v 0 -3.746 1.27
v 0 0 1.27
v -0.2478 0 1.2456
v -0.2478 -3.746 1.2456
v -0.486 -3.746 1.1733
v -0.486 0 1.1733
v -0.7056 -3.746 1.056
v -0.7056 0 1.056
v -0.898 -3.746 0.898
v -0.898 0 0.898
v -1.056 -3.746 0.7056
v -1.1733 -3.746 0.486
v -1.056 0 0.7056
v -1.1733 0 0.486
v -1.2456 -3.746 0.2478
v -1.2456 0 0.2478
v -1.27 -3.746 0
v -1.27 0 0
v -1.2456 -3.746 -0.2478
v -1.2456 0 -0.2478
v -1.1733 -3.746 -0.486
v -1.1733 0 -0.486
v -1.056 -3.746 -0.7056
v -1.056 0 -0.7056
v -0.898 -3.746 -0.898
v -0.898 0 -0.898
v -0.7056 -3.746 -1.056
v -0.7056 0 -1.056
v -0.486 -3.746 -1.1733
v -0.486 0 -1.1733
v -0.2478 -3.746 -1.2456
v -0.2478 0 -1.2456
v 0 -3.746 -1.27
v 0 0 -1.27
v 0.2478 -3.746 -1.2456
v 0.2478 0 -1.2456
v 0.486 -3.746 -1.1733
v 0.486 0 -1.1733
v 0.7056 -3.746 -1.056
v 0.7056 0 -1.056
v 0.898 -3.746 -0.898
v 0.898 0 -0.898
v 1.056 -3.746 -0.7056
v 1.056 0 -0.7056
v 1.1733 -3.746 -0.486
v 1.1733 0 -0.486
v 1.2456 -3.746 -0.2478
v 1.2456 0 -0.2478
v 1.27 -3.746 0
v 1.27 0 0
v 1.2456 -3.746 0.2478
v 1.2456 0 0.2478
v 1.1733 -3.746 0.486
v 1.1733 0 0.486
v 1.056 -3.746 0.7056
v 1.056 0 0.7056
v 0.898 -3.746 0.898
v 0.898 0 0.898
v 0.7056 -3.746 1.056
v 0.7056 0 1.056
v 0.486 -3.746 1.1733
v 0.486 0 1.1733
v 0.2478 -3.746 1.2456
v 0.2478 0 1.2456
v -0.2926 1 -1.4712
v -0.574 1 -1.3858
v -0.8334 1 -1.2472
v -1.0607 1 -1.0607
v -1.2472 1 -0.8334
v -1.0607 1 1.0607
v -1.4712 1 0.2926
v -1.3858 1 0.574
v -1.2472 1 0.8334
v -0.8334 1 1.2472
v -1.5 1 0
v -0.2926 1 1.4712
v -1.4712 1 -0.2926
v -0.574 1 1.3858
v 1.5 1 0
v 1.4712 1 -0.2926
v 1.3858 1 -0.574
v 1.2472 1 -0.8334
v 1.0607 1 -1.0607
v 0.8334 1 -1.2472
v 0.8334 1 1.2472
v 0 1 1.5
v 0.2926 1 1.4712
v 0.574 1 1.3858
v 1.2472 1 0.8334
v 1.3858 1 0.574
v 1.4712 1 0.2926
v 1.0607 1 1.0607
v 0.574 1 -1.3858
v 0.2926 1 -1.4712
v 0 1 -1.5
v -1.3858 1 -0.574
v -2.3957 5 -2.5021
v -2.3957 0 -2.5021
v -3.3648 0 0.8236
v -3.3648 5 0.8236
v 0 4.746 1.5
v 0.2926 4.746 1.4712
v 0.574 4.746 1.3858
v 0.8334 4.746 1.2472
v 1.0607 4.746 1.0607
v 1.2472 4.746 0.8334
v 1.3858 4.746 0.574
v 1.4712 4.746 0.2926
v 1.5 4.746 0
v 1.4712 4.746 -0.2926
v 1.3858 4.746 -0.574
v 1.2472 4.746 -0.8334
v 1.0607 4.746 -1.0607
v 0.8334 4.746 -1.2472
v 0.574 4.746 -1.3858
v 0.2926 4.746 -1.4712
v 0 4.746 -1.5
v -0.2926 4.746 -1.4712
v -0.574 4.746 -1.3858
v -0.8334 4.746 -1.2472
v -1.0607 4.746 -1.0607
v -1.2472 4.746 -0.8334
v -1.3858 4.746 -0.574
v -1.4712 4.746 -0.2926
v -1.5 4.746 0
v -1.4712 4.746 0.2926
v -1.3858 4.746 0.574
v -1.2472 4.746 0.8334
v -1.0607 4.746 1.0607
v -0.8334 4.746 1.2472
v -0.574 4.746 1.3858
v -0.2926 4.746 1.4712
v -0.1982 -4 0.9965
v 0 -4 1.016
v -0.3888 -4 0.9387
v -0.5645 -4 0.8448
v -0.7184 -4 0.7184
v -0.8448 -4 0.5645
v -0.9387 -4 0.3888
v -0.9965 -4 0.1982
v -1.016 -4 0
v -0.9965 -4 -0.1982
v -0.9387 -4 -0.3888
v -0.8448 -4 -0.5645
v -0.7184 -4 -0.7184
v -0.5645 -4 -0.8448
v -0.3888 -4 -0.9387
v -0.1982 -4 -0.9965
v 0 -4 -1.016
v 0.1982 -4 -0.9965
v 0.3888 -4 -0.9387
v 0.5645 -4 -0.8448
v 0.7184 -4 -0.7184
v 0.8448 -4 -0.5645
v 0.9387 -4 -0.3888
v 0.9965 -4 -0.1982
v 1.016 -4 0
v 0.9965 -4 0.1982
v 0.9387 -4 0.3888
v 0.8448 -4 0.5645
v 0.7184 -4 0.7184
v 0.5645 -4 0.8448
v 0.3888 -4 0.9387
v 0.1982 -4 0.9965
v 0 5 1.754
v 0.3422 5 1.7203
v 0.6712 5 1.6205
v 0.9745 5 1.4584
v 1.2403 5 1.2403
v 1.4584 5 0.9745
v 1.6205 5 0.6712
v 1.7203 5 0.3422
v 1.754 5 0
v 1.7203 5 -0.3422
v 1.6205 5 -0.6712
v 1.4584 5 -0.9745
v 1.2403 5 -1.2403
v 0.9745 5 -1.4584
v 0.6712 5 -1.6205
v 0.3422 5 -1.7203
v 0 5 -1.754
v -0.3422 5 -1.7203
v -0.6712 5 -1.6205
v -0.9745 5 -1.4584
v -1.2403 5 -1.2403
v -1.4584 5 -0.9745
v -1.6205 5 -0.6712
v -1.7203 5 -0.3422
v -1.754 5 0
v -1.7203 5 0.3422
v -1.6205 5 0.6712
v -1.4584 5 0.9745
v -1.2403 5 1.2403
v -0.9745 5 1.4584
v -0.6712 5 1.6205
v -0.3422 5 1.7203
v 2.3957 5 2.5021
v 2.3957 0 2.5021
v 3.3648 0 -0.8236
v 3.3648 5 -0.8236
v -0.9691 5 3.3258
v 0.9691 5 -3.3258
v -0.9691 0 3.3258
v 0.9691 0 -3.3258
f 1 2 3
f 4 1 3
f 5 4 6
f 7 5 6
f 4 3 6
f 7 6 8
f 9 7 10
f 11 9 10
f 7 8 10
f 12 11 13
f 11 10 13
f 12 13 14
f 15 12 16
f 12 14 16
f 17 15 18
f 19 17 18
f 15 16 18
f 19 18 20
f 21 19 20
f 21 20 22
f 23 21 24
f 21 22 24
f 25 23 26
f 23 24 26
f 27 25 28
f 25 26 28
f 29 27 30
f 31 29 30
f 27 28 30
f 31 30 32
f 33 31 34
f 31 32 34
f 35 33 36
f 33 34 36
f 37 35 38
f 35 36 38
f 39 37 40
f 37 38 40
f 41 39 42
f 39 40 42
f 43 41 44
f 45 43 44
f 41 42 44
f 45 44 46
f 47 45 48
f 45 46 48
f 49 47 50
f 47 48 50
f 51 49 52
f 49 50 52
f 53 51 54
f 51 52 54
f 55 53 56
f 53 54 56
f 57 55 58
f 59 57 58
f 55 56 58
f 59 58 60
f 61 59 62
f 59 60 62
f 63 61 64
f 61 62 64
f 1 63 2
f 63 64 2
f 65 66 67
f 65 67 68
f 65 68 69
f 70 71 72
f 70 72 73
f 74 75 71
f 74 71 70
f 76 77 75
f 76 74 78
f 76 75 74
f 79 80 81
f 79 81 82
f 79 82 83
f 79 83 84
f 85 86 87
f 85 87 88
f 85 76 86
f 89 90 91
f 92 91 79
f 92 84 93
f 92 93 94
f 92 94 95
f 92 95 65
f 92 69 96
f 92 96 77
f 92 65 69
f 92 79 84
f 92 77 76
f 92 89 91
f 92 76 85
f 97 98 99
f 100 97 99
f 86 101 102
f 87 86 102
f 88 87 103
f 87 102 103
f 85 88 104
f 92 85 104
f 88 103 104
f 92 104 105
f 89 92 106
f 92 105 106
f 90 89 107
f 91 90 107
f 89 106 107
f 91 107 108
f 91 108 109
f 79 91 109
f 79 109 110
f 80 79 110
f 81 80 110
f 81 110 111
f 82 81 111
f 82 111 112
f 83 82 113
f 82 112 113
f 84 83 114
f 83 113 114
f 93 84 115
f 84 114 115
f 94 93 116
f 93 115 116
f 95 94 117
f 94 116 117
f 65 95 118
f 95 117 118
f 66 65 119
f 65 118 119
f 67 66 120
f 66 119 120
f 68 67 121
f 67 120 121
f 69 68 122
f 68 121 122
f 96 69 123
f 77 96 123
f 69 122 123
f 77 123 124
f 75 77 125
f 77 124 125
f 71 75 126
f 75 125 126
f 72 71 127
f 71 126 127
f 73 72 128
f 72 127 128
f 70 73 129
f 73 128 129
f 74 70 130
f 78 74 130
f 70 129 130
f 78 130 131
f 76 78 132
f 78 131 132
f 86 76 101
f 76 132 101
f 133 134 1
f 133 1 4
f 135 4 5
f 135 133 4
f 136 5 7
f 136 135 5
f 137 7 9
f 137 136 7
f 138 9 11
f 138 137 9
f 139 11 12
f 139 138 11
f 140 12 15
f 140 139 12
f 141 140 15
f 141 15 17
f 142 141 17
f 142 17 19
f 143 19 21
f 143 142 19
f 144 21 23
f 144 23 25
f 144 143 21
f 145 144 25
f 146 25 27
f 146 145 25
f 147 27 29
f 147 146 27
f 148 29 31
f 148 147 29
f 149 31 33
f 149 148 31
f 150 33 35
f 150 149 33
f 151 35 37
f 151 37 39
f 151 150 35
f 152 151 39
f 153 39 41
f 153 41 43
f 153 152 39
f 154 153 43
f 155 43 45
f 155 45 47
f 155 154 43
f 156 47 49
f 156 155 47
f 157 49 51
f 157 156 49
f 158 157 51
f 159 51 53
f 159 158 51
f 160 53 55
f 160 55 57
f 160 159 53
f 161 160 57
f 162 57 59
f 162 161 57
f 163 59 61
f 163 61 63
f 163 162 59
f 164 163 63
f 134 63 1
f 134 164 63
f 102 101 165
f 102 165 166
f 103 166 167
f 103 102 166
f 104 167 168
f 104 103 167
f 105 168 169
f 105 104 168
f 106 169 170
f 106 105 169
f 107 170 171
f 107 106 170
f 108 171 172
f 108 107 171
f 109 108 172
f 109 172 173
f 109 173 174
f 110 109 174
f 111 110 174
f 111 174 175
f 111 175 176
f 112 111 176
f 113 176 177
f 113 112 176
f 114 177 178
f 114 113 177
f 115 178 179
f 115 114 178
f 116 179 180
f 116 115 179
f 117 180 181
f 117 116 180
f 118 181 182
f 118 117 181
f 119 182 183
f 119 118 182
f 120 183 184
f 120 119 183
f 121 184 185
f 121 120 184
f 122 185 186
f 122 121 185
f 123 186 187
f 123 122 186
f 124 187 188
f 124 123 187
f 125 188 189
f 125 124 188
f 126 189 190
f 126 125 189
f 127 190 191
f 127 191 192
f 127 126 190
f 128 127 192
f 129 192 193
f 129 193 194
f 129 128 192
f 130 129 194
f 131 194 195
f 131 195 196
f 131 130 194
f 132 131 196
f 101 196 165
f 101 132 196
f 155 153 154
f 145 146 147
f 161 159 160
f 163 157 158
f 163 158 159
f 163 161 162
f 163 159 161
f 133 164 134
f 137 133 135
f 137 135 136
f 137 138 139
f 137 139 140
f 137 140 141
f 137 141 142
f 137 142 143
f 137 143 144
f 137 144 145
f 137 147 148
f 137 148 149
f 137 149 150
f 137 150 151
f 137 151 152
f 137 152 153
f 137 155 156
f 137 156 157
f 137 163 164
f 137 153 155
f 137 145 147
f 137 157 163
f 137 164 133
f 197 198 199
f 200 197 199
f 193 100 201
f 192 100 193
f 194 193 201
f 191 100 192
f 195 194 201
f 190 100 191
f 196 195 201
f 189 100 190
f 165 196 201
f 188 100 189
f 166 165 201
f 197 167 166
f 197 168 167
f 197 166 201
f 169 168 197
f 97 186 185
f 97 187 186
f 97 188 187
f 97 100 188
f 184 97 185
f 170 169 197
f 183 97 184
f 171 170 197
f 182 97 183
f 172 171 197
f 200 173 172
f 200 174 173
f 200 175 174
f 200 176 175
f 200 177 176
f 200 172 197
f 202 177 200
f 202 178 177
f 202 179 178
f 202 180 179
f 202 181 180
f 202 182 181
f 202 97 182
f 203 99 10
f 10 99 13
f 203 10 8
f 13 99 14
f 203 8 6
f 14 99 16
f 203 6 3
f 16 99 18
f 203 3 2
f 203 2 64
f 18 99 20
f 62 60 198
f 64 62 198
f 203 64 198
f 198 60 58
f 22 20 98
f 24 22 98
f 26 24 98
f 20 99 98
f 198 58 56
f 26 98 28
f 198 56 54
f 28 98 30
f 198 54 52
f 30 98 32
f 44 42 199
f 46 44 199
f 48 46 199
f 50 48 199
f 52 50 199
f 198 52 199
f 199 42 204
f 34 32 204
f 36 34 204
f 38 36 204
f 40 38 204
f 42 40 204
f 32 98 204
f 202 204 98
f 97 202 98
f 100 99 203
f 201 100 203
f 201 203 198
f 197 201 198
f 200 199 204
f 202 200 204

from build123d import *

# Parameters (mm, degrees)
BOSS_EXTRUDE1_DEPTH = 5
SKETCH2_R           = 1.5
CUT_EXTRUDE1_DEPTH  = 4
SKETCH3_R           = 1.27
BOSS_EXTRUDE2_DEPTH = 4
CHAMFER1_SIZE       = 0.254
CHAMFER2_SIZE       = 0.254


with BuildPart() as part:
    # Sketch1 → Boss-Extrude1 (new body)
    with BuildSketch(Plane(origin=(0, 0, 0), x_dir=(1, 0, 0), z_dir=(0, 1, 0))):
        Polygon((2.395673947, -2.502148345), (3.364761004, 0.823640325), (0.969087057, 3.32578867), (-2.395673947, 2.502148345), (-3.364761004, -0.823640325), (-0.969087057, -3.32578867), align=None)
    extrude(amount=BOSS_EXTRUDE1_DEPTH)

    # Sketch2 → Cut-Extrude1 (cut)
    with BuildSketch(Plane(origin=(0, 5, 0), x_dir=(1, 0, 0), z_dir=(0, 1, 0))):
        with Locations(Location((0, 0, 0), (0, 0, 270))):
            Circle(SKETCH2_R)
    extrude(amount=-CUT_EXTRUDE1_DEPTH, mode=Mode.SUBTRACT)

    # Sketch3 → Boss-Extrude2 (add)
    with BuildSketch(Plane.XZ):
        with Locations(Location((0, 0, 0), (0, 0, 90))):
            Circle(SKETCH3_R)
    extrude(amount=BOSS_EXTRUDE2_DEPTH)

    # Chamfer1
    chamfer1_edges = [part.edges().sort_by_distance(p)[0] for p in [
        (0, -4, -1.27),
    ]]
    chamfer(chamfer1_edges, length=CHAMFER1_SIZE)

    # Chamfer2
    chamfer2_edges = [part.edges().sort_by_distance(p)[0] for p in [
        (0, 5, -1.5),
    ]]
    chamfer(chamfer2_edges, length=CHAMFER2_SIZE)


solid = part.part
